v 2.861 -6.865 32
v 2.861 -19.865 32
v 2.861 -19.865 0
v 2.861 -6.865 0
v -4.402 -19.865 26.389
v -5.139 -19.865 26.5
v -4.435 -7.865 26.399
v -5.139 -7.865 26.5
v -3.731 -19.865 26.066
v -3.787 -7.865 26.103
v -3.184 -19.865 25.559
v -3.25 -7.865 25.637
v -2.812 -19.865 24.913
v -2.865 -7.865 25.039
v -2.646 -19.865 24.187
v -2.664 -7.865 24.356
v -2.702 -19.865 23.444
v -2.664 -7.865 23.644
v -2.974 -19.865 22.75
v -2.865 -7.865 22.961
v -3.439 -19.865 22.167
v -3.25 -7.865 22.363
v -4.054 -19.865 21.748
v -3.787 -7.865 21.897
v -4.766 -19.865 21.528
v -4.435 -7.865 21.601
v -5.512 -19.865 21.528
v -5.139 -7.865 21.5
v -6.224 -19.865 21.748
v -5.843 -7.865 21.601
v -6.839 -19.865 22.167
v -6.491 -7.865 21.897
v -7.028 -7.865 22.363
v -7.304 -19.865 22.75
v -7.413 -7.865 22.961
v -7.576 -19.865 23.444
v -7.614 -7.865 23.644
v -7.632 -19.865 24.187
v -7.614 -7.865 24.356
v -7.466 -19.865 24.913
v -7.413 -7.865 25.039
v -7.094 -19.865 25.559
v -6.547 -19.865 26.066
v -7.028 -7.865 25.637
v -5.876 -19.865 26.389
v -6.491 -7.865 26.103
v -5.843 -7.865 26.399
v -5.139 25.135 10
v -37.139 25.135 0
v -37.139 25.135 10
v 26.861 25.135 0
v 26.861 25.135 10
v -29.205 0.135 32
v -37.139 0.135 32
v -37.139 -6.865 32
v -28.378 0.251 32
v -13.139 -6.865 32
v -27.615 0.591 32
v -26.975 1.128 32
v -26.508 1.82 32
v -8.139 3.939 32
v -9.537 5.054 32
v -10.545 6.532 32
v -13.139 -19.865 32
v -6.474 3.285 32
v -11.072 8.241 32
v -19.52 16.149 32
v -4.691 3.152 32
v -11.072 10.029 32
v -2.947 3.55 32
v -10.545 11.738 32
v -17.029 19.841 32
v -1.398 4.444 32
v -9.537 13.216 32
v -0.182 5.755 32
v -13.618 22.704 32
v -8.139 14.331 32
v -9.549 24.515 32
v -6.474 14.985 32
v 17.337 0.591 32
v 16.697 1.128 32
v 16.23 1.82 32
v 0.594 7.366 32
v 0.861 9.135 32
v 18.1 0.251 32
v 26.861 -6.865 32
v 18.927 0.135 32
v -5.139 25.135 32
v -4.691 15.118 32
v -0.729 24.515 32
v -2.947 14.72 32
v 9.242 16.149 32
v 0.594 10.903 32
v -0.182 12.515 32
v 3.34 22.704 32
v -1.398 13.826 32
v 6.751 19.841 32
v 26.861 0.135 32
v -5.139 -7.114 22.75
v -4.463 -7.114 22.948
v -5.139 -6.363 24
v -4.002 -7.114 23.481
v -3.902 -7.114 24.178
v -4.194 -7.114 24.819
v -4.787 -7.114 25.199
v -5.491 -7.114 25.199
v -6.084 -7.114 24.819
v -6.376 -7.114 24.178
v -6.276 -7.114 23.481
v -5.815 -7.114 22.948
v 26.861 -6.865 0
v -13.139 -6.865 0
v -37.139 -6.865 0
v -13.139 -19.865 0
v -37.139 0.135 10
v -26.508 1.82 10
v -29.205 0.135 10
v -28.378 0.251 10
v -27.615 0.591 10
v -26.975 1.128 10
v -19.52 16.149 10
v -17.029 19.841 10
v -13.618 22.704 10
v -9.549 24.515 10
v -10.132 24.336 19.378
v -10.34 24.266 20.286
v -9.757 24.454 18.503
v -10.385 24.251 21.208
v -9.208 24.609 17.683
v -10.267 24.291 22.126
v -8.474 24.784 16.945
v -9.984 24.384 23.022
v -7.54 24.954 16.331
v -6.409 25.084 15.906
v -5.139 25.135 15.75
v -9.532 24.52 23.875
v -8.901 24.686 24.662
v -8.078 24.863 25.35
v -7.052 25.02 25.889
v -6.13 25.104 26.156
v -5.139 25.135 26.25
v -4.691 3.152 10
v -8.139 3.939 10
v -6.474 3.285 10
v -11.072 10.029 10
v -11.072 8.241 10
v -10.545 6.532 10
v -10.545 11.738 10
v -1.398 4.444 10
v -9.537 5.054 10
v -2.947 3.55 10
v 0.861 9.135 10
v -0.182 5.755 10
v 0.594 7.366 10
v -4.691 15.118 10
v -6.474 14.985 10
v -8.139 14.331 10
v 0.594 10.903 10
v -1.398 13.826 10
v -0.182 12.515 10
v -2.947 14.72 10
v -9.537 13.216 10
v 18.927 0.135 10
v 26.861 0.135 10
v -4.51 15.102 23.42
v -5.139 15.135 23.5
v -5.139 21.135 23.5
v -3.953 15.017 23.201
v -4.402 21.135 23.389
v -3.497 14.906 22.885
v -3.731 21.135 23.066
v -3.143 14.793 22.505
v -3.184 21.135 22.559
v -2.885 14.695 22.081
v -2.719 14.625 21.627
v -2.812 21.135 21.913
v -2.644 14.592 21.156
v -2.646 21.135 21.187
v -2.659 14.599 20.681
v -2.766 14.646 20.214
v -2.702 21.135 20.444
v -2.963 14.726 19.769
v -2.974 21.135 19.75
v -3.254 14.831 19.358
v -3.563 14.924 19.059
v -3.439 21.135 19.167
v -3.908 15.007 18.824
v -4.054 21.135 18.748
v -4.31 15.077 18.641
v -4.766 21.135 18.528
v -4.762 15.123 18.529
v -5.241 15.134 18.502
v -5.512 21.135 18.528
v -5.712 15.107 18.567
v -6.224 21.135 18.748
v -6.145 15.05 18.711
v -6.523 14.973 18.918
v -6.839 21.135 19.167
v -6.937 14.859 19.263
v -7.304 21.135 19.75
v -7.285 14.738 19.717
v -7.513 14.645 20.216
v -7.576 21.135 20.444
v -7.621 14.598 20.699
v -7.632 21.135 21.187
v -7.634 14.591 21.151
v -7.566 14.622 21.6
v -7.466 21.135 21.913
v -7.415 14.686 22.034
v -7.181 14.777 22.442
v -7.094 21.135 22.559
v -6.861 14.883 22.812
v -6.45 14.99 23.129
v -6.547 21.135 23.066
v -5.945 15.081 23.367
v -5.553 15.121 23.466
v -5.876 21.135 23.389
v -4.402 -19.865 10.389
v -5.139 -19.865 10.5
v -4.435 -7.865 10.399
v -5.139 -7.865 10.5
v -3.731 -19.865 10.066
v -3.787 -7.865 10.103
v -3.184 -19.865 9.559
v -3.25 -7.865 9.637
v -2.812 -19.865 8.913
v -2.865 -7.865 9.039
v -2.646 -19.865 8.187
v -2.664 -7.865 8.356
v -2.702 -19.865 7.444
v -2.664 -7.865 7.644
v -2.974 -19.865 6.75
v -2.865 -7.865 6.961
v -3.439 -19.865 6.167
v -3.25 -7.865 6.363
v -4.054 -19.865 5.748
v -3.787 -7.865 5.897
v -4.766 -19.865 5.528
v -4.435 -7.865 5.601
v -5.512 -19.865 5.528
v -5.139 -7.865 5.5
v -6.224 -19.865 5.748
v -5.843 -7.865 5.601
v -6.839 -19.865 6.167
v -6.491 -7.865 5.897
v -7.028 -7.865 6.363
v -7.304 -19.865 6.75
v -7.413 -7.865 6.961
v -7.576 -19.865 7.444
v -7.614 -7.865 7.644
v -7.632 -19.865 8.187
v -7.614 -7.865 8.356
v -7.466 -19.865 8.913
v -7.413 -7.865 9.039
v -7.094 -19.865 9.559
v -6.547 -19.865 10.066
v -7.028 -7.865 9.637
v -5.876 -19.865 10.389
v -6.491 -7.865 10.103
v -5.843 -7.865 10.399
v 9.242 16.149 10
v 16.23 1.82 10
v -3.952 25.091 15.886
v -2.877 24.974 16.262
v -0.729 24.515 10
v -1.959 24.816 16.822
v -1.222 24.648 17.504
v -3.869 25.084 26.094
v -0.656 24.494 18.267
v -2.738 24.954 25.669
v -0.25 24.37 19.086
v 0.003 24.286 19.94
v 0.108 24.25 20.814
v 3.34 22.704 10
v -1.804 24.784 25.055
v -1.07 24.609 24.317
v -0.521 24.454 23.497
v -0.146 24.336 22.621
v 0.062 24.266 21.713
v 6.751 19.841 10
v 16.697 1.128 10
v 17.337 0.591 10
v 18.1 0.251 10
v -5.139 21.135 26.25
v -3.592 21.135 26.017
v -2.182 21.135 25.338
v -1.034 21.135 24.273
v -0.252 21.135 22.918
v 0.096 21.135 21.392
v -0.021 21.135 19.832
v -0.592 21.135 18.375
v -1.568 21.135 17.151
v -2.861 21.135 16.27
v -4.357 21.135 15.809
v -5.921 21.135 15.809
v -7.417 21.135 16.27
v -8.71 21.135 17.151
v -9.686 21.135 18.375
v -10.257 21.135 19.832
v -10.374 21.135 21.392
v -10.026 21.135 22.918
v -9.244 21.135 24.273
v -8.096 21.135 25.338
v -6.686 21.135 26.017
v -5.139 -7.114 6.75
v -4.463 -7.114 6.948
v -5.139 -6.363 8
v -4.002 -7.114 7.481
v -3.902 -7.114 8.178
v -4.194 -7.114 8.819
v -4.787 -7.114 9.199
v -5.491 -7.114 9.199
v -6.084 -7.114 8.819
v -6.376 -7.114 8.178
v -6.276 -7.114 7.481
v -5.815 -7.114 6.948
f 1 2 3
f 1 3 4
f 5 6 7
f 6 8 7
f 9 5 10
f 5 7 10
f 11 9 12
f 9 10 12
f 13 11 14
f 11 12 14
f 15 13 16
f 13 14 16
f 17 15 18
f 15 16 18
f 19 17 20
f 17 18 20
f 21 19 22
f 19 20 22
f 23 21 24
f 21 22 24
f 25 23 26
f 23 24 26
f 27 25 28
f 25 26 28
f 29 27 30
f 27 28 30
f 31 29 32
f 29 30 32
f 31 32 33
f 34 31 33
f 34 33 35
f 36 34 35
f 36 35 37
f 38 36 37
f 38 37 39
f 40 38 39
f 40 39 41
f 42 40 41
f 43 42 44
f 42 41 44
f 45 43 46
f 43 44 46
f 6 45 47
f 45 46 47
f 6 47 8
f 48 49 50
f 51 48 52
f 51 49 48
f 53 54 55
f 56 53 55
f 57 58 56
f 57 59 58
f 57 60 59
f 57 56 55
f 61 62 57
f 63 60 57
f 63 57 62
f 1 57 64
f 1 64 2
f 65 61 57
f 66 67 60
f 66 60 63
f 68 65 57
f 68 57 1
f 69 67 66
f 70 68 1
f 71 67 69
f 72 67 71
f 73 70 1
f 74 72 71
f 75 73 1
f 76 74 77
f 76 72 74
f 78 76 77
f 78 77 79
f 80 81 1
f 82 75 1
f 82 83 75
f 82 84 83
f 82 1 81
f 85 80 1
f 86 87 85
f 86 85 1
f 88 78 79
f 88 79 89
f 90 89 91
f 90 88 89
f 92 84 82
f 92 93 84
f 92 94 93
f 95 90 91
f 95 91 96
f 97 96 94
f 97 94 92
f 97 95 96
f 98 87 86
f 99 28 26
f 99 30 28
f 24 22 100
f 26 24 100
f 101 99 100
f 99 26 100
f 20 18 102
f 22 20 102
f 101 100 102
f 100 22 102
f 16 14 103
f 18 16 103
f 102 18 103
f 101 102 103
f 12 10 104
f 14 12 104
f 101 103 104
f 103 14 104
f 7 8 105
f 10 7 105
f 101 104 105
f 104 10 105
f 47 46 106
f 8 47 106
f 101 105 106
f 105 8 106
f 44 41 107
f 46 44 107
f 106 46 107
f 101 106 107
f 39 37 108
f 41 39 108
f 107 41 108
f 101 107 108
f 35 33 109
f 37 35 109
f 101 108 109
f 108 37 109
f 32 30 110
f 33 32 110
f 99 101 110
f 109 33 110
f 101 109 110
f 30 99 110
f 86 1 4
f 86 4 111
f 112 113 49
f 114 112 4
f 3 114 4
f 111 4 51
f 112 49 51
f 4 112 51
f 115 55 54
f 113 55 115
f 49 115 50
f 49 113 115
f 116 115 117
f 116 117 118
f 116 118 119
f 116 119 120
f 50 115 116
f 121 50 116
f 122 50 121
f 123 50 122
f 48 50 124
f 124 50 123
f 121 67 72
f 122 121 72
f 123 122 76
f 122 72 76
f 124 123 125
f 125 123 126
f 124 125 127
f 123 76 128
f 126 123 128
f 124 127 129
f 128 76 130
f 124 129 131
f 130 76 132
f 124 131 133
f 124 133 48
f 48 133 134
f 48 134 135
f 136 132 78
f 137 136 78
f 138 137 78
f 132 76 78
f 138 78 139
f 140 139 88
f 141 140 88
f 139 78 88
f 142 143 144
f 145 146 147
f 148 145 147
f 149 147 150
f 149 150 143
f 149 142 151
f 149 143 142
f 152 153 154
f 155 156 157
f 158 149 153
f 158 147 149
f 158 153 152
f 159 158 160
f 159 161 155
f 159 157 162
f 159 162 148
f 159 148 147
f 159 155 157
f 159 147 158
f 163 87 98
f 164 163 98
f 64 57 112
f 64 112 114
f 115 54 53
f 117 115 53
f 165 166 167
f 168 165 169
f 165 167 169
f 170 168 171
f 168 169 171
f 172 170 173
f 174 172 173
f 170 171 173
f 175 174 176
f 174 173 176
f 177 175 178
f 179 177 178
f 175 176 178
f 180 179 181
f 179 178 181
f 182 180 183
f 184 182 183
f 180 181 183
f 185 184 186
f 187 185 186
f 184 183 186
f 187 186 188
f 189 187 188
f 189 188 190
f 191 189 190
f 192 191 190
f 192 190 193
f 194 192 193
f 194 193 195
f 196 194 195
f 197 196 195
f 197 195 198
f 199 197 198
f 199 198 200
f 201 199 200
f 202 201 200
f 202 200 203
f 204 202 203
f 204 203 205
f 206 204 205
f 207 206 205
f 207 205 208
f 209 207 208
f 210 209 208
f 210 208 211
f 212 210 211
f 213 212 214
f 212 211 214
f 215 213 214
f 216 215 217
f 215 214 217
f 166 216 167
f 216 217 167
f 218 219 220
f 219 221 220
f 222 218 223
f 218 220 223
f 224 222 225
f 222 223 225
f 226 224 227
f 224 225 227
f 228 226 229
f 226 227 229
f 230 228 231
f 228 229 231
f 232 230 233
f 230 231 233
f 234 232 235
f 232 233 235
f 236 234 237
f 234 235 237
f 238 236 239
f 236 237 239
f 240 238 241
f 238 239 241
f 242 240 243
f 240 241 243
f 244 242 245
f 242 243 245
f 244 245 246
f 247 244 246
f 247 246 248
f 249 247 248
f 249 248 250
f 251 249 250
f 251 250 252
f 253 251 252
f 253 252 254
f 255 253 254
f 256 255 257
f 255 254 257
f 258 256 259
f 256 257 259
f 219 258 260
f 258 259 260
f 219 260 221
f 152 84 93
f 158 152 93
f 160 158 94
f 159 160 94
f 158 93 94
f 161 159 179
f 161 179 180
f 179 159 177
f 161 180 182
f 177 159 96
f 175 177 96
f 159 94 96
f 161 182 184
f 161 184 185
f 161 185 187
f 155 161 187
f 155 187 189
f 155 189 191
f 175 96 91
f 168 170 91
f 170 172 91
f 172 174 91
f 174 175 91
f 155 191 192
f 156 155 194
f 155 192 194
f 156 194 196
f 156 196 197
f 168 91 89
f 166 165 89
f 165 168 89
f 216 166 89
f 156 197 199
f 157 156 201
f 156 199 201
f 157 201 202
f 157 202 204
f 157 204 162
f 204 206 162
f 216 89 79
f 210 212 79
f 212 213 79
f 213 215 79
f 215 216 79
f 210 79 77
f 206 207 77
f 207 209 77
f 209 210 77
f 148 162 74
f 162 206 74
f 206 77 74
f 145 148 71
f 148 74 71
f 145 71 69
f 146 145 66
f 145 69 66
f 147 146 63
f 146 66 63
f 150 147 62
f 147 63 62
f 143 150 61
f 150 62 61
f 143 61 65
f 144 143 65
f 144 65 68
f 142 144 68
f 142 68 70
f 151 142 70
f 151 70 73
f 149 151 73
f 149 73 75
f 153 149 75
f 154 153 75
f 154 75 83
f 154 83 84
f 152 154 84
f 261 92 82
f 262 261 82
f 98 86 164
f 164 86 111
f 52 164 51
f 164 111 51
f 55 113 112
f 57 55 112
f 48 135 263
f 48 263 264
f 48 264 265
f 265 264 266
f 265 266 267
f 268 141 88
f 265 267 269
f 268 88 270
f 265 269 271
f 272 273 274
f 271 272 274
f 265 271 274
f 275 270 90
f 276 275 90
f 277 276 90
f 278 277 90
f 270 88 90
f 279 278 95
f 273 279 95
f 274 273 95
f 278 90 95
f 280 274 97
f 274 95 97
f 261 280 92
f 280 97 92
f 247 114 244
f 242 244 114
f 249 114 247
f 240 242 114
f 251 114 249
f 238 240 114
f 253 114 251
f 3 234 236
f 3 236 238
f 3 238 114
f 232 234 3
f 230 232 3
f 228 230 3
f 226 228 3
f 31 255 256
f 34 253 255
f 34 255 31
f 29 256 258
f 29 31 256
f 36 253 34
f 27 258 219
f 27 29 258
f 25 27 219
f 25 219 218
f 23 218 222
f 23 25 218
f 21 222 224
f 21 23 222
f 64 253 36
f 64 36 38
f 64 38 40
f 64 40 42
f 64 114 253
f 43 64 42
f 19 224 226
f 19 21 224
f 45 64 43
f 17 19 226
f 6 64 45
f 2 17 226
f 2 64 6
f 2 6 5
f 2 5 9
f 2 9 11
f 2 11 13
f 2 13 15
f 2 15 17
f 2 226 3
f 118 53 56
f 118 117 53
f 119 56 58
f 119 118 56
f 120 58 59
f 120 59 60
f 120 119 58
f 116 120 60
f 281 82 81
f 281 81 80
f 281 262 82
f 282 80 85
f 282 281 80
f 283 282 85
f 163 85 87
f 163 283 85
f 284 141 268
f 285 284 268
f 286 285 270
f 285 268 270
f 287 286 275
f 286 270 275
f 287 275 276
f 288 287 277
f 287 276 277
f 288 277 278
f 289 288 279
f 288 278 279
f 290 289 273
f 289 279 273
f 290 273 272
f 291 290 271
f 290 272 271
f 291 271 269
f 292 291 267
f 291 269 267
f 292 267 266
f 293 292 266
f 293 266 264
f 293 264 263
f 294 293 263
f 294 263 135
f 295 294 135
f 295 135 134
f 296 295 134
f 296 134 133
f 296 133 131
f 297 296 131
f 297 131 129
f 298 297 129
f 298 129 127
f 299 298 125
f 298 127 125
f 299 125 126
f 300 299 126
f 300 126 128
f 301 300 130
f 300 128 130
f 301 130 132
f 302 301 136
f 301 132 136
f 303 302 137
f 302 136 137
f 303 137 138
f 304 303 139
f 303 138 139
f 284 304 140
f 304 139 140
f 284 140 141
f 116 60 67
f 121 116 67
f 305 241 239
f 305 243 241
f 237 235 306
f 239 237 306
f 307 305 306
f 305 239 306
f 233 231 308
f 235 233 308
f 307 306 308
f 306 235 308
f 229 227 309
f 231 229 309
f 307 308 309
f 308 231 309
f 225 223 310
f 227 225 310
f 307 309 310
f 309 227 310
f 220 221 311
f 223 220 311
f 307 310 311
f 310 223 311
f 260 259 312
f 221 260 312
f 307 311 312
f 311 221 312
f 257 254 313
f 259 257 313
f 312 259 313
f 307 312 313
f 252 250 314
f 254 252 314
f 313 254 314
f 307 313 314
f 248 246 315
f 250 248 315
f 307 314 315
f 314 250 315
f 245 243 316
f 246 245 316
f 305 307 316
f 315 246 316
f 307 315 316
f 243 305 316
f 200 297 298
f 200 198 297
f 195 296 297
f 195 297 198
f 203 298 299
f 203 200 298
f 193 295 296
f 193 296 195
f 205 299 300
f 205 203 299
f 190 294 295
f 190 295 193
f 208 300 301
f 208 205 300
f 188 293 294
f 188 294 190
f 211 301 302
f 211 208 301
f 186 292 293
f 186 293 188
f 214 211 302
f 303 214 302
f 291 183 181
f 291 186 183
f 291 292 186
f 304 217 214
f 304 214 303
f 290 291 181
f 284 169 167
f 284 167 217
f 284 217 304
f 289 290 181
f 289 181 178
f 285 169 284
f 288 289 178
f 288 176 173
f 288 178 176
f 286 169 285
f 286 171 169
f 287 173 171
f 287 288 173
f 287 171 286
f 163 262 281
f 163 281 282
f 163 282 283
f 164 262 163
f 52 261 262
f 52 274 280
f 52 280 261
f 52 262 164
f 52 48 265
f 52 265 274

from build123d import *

# Parameters (mm, degrees)
IZIM1_W                     = 64
IZIM1_H                     = 32
Y_KSEKLIK_EKSTR_ZYON1_DEPTH = 32
Y_KSEKLIK_EKSTR_ZYON3_DEPTH = 32
IZIM3_R                     = 6
KES_EKSTR_ZYON3_DEPTH       = 22
KES_EKSTR_ZYON4_DEPTH       = 22
RADYUS1_R                   = 3
IZIM6_R                     = 5.25
KES_EKSTR_ZYON5_DEPTH       = 4
M6X1_0_DI_LI_DELIK1_REACH   = 58.089
M6X1_0_DI_LI_DELIK1_BORE_R  = 2.5
M6X1_0_DI_LI_DELIK2_D       = 5
M6X1_0_DI_LI_DELIK2_DEPTH   = 12
M6X1_0_DI_LI_DELIK2_TIP     = 1.502151548


with BuildPart() as part:
    # Çizim1 → Yükseklik-Ekstrüzyon1 (new body)
    with BuildSketch(Plane.XY):
        with Locations((-5.139018929, 9.134948097)):
            Rectangle(IZIM1_W, IZIM1_H)
    extrude(amount=Y_KSEKLIK_EKSTR_ZYON1_DEPTH)

    # Çizim2 → Yükseklik-Ekstrüzyon3 (add)
    with BuildSketch(Plane.XY.offset(32)):
        Polygon((-5.139018929, -19.865051903), (2.860981071, -19.865051903), (2.860981071, -6.865051903), (-5.139018929, -6.865051903), (-13.139018929, -6.865051903), (-13.139018929, -19.865051903), align=None)
    extrude(amount=-Y_KSEKLIK_EKSTR_ZYON3_DEPTH)

    # Çizim3 → Kes-Ekstrüzyon3 (cut)
    with BuildSketch(Plane.XY.offset(32)):
        with Locations((-5.139018929, 9.134948097)):
            Circle(IZIM3_R)
    extrude(amount=-KES_EKSTR_ZYON3_DEPTH, mode=Mode.SUBTRACT)

    # Çizim5 → Kes-Ekstrüzyon4 (cut)
    with BuildSketch(Plane.XY.offset(32)):
        with BuildLine():
            ThreePointArc((-19.51972367, 16.148886446), (-13.617727108, 22.703717666), (-5.139018815, 25.134948097))
            Line((-5.139018815, 25.134948097), (-37.139018929, 25.134948097))
            Line((-37.139018929, 25.134948097), (-37.139018929, 0.134948097))
            Line((-37.139018929, 0.134948097), (-27.330243274, 0.134948097))
            Line((-27.330243274, 0.134948097), (-19.51972367, 16.148886446))
        make_face()
        with BuildLine():
            ThreePointArc((-5.139018815, 25.134948097), (3.339689347, 22.703717605), (9.241685811, 16.148886446))
            Line((9.241685811, 16.148886446), (17.052205415, 0.134948097))
            Line((17.052205415, 0.134948097), (26.860981071, 0.134948097))
            Line((26.860981071, 0.134948097), (26.860981071, 25.134948097))
            Line((26.860981071, 25.134948097), (-5.139018815, 25.134948097))
        make_face()
    extrude(amount=-KES_EKSTR_ZYON4_DEPTH, mode=Mode.SUBTRACT)

    # Radyus1
    radyus1_edges = [part.edges().sort_by_distance(p)[0] for p in [
        (-27.330243274, 0.134948097, 21),
        (17.052205415, 0.134948097, 21),
    ]]
    fillet(radyus1_edges, radius=RADYUS1_R)

    # Çizim6 → Kes-Ekstrüzyon5 (cut)
    with BuildSketch(Plane(origin=(0, 25.134948097, 0), x_dir=(1, 0, 0), z_dir=(0, 1, 0))):
        with Locations(Location((-5.139018929, -21, 0), (0, 0, 270))):
            Circle(IZIM6_R)
    extrude(amount=-KES_EKSTR_ZYON5_DEPTH, mode=Mode.SUBTRACT)

    # M6x1.0 Dişli Delik1 bore (on position points) → M6x1.0 Dişli Delik1 (cut, up to next)
    with BuildSketch(Plane(origin=(-5.139018929, 21.134948097, 21), x_dir=(0, 0, 1), z_dir=(0, 1, 0)), mode=Mode.PRIVATE) as m6x1_0_di_li_delik1_sk1:
        Circle(M6X1_0_DI_LI_DELIK1_BORE_R)
    m6x1_0_di_li_delik1_tool1 = extrude(m6x1_0_di_li_delik1_sk1.sketch, amount=-M6X1_0_DI_LI_DELIK1_REACH, mode=Mode.PRIVATE) & part.part
    add(m6x1_0_di_li_delik1_tool1.solids().sort_by_distance((-5.139019, 21.134948, 21))[0], mode=Mode.SUBTRACT)

    # M6x1.0 Dişli Delik2
    with Locations(Plane(origin=(-5.139018929, -19.865051903, 24), x_dir=(0, 0, -1), z_dir=(0, -1, 0))):
        with Locations((0, 0), (16, 0)):
            Hole(M6X1_0_DI_LI_DELIK2_D / 2, depth=M6X1_0_DI_LI_DELIK2_DEPTH)
            with Locations((0, 0, -(M6X1_0_DI_LI_DELIK2_DEPTH + M6X1_0_DI_LI_DELIK2_TIP / 2))):  # 118° drill point
                Cone(0, M6X1_0_DI_LI_DELIK2_D / 2, M6X1_0_DI_LI_DELIK2_TIP, mode=Mode.SUBTRACT)


solid = part.part
